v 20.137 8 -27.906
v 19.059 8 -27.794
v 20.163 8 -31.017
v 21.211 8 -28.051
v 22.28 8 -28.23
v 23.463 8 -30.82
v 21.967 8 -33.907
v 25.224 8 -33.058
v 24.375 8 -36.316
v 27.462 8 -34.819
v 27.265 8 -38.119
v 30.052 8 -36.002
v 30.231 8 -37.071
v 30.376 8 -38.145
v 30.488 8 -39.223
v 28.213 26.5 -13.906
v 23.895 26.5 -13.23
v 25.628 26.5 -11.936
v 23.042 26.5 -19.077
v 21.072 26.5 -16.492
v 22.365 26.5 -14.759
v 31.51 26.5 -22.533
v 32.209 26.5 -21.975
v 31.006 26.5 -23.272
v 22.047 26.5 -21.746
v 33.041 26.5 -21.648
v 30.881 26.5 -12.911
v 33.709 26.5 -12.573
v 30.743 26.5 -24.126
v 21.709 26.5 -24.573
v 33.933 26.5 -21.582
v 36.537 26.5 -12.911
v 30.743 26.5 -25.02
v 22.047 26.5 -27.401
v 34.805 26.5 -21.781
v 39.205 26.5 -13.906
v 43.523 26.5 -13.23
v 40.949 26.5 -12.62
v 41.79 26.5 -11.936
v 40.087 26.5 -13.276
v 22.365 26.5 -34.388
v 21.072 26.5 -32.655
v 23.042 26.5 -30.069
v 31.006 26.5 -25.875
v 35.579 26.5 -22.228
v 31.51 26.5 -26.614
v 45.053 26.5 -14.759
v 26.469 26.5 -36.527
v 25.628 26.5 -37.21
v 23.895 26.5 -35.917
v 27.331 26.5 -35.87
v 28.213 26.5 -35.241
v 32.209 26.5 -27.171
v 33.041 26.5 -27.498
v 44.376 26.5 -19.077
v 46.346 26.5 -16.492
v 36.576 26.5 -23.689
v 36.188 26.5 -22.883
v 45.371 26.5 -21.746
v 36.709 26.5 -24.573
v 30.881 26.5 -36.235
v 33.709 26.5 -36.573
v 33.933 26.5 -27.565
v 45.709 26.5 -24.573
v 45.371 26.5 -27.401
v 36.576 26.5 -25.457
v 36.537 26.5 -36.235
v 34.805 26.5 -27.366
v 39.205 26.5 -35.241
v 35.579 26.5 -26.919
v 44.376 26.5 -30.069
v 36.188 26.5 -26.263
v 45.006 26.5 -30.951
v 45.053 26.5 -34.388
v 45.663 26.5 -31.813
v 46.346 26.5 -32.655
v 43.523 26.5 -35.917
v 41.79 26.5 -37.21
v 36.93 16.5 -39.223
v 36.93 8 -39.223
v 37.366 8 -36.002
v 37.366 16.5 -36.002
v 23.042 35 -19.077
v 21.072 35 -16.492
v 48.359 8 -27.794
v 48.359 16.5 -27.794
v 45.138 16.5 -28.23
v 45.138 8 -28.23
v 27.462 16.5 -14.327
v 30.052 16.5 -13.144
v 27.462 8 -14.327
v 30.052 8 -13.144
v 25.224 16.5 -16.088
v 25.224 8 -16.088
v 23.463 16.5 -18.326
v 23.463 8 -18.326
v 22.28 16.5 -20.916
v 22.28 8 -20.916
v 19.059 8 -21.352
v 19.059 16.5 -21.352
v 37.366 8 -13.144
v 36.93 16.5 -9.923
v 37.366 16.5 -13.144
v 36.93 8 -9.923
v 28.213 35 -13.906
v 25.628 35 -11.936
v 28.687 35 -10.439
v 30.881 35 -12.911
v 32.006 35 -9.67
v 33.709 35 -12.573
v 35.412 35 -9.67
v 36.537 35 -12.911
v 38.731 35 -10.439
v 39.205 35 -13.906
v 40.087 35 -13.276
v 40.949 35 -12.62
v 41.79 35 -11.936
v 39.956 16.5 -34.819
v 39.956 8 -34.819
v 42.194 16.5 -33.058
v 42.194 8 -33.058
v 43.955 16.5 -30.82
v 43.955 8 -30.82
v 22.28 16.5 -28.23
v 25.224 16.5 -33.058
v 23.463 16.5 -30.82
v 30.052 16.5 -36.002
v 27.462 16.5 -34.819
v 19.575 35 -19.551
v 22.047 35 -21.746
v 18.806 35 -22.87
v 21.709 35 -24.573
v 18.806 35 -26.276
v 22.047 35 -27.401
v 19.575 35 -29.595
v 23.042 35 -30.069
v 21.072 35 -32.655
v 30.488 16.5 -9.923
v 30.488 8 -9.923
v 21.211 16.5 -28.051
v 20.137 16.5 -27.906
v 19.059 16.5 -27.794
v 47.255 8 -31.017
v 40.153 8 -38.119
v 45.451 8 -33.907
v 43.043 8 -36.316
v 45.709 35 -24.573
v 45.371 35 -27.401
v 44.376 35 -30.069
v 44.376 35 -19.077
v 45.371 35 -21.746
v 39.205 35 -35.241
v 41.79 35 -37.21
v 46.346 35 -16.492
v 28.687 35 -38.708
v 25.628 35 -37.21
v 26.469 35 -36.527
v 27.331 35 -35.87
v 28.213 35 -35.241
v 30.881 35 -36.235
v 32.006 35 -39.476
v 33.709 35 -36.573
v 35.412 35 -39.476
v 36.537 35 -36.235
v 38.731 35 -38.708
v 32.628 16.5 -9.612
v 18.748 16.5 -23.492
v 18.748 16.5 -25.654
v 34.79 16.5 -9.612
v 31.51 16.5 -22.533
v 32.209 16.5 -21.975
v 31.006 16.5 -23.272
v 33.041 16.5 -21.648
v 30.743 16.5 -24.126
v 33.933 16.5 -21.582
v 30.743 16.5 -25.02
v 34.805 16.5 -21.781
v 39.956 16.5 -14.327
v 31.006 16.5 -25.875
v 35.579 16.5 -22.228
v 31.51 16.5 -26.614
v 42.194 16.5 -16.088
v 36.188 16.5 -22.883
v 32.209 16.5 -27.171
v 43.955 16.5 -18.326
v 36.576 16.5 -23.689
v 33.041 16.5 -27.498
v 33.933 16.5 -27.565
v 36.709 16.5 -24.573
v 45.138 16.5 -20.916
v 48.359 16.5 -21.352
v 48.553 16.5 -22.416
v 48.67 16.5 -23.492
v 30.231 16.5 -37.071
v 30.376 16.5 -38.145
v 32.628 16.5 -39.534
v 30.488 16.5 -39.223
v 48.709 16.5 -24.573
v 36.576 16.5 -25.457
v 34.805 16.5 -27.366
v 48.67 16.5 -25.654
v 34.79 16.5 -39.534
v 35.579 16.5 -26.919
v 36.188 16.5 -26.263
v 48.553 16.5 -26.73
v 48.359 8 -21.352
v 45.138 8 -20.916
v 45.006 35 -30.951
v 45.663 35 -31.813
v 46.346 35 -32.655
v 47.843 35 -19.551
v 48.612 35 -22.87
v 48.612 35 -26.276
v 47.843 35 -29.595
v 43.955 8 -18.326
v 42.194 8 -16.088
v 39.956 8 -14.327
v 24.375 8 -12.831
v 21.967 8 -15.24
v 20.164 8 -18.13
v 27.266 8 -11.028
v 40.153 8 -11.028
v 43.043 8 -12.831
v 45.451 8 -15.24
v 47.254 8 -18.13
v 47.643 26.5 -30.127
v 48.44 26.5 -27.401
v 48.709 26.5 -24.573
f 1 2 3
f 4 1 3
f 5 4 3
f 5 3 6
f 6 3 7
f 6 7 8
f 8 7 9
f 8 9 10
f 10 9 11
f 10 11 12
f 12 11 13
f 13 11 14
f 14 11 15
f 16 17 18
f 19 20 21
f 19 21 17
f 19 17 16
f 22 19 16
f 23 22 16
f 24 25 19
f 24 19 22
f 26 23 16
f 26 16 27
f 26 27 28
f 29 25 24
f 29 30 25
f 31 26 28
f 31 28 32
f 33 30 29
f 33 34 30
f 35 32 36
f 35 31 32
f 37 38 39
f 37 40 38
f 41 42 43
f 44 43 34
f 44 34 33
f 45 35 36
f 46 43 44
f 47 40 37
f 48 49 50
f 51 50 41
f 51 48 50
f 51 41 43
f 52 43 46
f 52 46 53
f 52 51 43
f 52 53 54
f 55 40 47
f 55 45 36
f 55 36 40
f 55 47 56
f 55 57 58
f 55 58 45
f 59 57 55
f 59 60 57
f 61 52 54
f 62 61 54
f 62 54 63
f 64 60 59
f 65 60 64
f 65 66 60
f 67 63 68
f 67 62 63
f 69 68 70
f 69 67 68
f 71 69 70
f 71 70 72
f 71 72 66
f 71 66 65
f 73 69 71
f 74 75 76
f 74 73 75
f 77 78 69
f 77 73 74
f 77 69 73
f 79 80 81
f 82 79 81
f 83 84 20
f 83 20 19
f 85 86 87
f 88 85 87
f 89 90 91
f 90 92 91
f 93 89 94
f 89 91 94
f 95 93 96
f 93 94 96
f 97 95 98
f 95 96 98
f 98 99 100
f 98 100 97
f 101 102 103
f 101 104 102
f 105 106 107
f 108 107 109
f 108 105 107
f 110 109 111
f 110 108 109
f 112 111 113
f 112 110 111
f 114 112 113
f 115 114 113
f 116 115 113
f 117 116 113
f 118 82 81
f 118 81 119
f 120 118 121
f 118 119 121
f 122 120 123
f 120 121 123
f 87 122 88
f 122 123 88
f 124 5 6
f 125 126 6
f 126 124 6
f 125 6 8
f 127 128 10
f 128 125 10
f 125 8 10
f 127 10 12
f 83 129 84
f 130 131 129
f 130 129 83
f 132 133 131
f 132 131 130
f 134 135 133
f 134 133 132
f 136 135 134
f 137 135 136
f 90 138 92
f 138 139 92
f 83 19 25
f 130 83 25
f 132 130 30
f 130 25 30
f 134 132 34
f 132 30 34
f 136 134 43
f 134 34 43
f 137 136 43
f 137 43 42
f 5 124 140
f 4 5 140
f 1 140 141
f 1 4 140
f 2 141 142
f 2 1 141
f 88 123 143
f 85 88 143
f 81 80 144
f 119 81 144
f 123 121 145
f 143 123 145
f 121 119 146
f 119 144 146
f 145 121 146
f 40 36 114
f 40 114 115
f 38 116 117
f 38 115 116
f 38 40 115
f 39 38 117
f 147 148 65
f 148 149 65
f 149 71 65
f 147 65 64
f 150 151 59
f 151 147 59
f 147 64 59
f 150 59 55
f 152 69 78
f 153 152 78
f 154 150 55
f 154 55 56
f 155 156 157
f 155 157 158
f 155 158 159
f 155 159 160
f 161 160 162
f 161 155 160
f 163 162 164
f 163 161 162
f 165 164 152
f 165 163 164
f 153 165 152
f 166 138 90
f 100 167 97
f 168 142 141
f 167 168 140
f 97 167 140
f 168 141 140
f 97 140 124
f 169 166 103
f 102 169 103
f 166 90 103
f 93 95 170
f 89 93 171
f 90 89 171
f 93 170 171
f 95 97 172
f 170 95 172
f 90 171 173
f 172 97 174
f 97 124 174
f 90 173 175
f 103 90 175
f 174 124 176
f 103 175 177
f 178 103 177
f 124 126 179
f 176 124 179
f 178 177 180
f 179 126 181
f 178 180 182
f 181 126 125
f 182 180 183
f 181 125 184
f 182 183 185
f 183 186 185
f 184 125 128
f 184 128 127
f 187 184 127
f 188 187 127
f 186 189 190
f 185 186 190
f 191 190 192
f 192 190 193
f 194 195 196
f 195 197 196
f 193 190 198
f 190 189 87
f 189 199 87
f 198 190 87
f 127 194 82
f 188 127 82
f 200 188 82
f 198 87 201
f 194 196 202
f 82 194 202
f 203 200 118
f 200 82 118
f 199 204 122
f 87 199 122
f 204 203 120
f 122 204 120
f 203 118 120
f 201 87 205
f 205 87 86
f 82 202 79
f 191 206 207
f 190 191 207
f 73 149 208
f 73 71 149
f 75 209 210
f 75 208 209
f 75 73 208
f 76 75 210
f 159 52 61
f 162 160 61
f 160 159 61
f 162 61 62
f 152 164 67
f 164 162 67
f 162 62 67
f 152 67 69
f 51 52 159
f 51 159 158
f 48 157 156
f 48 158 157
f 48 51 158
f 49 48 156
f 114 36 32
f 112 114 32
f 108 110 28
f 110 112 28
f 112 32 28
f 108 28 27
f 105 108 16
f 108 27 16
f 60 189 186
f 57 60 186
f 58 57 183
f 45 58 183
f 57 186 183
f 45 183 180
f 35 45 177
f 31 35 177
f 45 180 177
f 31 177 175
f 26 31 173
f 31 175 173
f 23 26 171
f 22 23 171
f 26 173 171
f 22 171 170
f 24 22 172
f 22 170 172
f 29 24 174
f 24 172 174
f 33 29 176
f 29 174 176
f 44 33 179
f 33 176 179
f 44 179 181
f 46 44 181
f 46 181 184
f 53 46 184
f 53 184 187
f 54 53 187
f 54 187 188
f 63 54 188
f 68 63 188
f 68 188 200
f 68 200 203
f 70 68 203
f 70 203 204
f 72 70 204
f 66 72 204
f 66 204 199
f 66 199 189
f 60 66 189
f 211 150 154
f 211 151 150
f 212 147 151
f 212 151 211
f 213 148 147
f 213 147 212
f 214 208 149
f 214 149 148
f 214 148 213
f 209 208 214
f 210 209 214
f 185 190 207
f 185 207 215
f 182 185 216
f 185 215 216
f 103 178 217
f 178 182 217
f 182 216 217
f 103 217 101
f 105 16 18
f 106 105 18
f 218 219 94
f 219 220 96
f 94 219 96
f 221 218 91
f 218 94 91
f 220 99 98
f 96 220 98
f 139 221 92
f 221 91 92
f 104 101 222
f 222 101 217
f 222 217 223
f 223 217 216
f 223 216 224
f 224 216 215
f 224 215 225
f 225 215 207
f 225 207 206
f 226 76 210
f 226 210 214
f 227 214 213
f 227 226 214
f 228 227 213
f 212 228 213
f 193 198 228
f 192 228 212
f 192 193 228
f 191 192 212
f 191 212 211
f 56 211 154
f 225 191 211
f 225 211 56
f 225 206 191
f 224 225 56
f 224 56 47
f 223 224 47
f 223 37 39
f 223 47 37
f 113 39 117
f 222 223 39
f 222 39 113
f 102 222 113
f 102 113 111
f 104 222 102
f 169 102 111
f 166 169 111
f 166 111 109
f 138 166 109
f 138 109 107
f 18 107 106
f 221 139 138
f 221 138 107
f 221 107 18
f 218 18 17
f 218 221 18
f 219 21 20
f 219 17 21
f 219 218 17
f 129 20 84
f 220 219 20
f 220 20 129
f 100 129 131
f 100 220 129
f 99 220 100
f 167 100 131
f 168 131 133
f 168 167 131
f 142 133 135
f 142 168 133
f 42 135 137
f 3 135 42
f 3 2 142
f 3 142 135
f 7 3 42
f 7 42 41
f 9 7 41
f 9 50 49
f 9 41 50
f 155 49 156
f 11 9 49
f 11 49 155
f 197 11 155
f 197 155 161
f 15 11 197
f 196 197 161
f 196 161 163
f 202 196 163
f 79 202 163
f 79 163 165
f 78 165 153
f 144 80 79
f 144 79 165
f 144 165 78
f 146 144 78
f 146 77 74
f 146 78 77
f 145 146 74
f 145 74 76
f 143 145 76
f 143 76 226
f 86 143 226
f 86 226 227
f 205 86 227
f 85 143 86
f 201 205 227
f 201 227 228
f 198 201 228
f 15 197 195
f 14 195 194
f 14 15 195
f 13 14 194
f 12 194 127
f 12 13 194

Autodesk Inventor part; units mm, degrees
ref_plane "YZ Plane" through (0, 0, 0) normal (1, 0, 0) x (0, 1, 0)
ref_plane "XZ Plane" through (0, 0, 0) normal (0, 1, 0) x (-1, 0, 0)
ref_plane "XY Plane" through (0, 0, 0) normal (0, 0, 1) x (1, 0, 0)
ref_plane "作業平面1" through (0, 8, 0) normal (0, 1, 0) x (1, 0, 0)
sketch "スケッチ2" plane through (0, 8, 0) normal (0, 1, 0) x (1, 0, 0)
  arc A0 (28.3537, 29.9285) -> (28.3537, 54.5732) centre (-4.0051, 42.2508) ccw projected
  arc A1 (39.0644, 29.9285) -> (63.709, 29.9285) centre (51.3867, 62.2873) ccw projected
  line L0 (28.3537, 29.9285) -> (39.0644, 29.9285)
  arc A2 (39.0644, 19.2178) -> (39.0644, -5.4268) centre (71.4231, 6.8955) ccw projected
  line L1 (39.0644, 29.9285) -> (39.0644, 19.2178)
  arc A3 (28.3537, -5.4268) -> (28.3537, 19.2178) centre (-4.0051, 6.8955) ccw projected
  line L2 (39.0644, 19.2178) -> (28.3537, 19.2178)
  line L3 (28.3537, 19.2178) -> (28.3537, 29.9285)
  arc A4 (3.709, 29.9285) -> (28.3537, 29.9285) centre (16.0314, 62.2873) ccw projected
  line L4 (39.0644, 29.9285) -> (28.3537, 19.2178)
  line L5 (28.3537, 29.9285) -> (39.0644, 19.2178)
  circle A5 centre (33.709, 24.5732) radius 3
  circle A6 centre (33.709, 24.5732) radius 89.9592
  circle A7 centre (33.709, 24.5732) radius 15
  circle A8 centre (33.709, 24.5732) radius 12
  line L6 (30.4879, 39.2232) -> (30.052, 36.0024)
  line L7 (19.059, 27.7943) -> (22.2798, 28.2302)
  line L8 (30.4879, 9.9231) -> (30.052, 13.144)
  circle A9 centre (33.709, 24.5732) radius 15
  circle A10 centre (33.709, 24.5732) radius 12
  line L9 (19.059, 21.352) -> (22.2798, 20.9162)
  line L10 (48.3591, 21.352) -> (45.1382, 20.9162)
  circle A11 centre (33.709, 24.5732) radius 15
  circle A12 centre (33.709, 24.5732) radius 12
  line L11 (36.9302, 9.9231) -> (37.366, 13.144)
  line L12 (36.9302, 39.2232) -> (37.366, 36.0024)
  circle A13 centre (33.709, 24.5732) radius 15
  circle A14 centre (33.709, 24.5732) radius 12
  line L13 (48.3591, 27.7943) -> (45.1382, 28.2302)
  point P0 (0, 0)
  point P1 (22.2798, 28.2302)
  point P2 (30.052, 36.0024)
  point P3 (30.4879, 39.2232)
  point P4 (19.059, 27.7943)
  point P5 (30.4879, 9.9231)
  point P6 (30.052, 13.144)
  point P7 (37.366, 13.144)
  point P8 (36.9302, 9.9231)
  point P9 (45.1382, 28.2302)
  point P10 (48.3591, 27.7943)
  dimension "d6" = 6
  dimension "d7" = 30
  dimension "d8" = 24
  dimension "d13" = 360
extrude "押し出し2" add sketch "スケッチ2" along normal blind 8.5 contours L6 A0 | A8 L7 A7 L6 | A4 L7 | L12 A7 L13 A8 | L8 A7 L9 A8 | A8 L10 A7 L11
ref_plane "作業平面2" through (0, 16.5, 0) normal (0, 1, 0) x (1, 0, 0)
sketch "スケッチ4" plane through (0, 16.5, 0) normal (0, 1, 0) x (1, 0, 0)
  arc A0 (30.052, 36.0024) -> (22.2798, 28.2302) centre (33.709, 24.5732) ccw projected
  arc A1 (28.3537, 29.9285) -> (30.052, 36.0024) centre (-4.0051, 42.2508) ccw projected
  line L0 (22.2798, 28.2302) -> (30.052, 36.0024)
  line L1 (30.052, 36.0024) -> (26.1659, 32.1163)
  arc A2 (37.366, 13.144) -> (45.1382, 20.9162) centre (33.709, 24.5732) ccw projected
  line L2 (33.709, 24.5732) -> (26.1659, 32.1163)
  circle A3 centre (33.709, 24.5732) radius 15
  point P0 (0, 0)
extrude "押し出し3" add sketch "スケッチ4" along normal blind 10 contours L0 A0 | A1 L2 L0 | A3
sketch "スケッチ6" plane through (33.709, 26.5, -24.5732) normal (0, 1, 0) x (1, 0, 0)
  circle A0 centre (0, 0) radius 15
  circle A1 centre (0, 0) radius 12
  arc A2 (-12.6369, -8.0814) -> (-10.6675, -5.4958) centre (-39.1679, 14.1679) ccw
  line L0 (-12.6369, -8.0814) -> (-10.6675, -5.4958)
  line L1 (-5.4958, -10.6675) -> (-8.0814, -12.6369)
  arc A3 (8.0814, -12.6369) -> (5.4958, -10.6675) centre (-14.1679, -39.1679) ccw
  line L2 (10.6675, -5.4958) -> (12.6369, -8.0814)
  arc A4 (12.6369, 8.0814) -> (10.6675, 5.4958) centre (39.1679, -14.1679) ccw
  line L3 (5.4958, 10.6675) -> (8.0814, 12.6369)
  arc A5 (-8.0814, 12.6369) -> (-5.4958, 10.6675) centre (14.1679, 39.1679) ccw
  line L4 (-10.6675, 5.4958) -> (-12.6369, 8.0814)
  point P0 (-33.709, -24.5732)
  point P1 (-10.6675, 5.4958)
  point P2 (-12.6369, 8.0814)
  point P3 (-12.6369, -8.0814)
  point P4 (-10.6675, -5.4958)
  point P5 (8.0814, -12.6369)
  point P6 (5.4958, -10.6675)
  point P7 (-5.4958, -10.6675)
  point P8 (-8.0814, -12.6369)
  point P9 (12.6369, 8.0814)
  point P10 (10.6675, 5.4958)
  point P11 (-8.0814, 12.6369)
  point P12 (-5.4958, 10.6675)
  point P13 (5.4958, 10.6675)
  dimension "d19" = 24
  dimension "d20" = 30
  dimension "d23" = 360
extrude "押し出し4" add sketch "スケッチ6" along normal blind 8.5 contours A0 L2 A1 A4 | L3 A1 A5 A0 | A0 L1 A1 A3 | L4 A1 L0 A0
sketch "スケッチ7" plane through (0, 16.5, 0) normal (0, -1, 0) x (1, 0, 0)
  arc A0 (44.3766, -30.0689) -> (44.3766, -19.0774) centre (33.709, -24.5732) ccw projected
  line L0 (33.709, -24.5732) -> (48.7, -24.5732)
  circle A1 centre (33.709, -24.5732) radius 3
  point P0 (0, 0)
  dimension "d27" = 6
extrude "押し出し5" cut sketch "スケッチ7" against normal blind 10
properties part number "隙間パーツ"
